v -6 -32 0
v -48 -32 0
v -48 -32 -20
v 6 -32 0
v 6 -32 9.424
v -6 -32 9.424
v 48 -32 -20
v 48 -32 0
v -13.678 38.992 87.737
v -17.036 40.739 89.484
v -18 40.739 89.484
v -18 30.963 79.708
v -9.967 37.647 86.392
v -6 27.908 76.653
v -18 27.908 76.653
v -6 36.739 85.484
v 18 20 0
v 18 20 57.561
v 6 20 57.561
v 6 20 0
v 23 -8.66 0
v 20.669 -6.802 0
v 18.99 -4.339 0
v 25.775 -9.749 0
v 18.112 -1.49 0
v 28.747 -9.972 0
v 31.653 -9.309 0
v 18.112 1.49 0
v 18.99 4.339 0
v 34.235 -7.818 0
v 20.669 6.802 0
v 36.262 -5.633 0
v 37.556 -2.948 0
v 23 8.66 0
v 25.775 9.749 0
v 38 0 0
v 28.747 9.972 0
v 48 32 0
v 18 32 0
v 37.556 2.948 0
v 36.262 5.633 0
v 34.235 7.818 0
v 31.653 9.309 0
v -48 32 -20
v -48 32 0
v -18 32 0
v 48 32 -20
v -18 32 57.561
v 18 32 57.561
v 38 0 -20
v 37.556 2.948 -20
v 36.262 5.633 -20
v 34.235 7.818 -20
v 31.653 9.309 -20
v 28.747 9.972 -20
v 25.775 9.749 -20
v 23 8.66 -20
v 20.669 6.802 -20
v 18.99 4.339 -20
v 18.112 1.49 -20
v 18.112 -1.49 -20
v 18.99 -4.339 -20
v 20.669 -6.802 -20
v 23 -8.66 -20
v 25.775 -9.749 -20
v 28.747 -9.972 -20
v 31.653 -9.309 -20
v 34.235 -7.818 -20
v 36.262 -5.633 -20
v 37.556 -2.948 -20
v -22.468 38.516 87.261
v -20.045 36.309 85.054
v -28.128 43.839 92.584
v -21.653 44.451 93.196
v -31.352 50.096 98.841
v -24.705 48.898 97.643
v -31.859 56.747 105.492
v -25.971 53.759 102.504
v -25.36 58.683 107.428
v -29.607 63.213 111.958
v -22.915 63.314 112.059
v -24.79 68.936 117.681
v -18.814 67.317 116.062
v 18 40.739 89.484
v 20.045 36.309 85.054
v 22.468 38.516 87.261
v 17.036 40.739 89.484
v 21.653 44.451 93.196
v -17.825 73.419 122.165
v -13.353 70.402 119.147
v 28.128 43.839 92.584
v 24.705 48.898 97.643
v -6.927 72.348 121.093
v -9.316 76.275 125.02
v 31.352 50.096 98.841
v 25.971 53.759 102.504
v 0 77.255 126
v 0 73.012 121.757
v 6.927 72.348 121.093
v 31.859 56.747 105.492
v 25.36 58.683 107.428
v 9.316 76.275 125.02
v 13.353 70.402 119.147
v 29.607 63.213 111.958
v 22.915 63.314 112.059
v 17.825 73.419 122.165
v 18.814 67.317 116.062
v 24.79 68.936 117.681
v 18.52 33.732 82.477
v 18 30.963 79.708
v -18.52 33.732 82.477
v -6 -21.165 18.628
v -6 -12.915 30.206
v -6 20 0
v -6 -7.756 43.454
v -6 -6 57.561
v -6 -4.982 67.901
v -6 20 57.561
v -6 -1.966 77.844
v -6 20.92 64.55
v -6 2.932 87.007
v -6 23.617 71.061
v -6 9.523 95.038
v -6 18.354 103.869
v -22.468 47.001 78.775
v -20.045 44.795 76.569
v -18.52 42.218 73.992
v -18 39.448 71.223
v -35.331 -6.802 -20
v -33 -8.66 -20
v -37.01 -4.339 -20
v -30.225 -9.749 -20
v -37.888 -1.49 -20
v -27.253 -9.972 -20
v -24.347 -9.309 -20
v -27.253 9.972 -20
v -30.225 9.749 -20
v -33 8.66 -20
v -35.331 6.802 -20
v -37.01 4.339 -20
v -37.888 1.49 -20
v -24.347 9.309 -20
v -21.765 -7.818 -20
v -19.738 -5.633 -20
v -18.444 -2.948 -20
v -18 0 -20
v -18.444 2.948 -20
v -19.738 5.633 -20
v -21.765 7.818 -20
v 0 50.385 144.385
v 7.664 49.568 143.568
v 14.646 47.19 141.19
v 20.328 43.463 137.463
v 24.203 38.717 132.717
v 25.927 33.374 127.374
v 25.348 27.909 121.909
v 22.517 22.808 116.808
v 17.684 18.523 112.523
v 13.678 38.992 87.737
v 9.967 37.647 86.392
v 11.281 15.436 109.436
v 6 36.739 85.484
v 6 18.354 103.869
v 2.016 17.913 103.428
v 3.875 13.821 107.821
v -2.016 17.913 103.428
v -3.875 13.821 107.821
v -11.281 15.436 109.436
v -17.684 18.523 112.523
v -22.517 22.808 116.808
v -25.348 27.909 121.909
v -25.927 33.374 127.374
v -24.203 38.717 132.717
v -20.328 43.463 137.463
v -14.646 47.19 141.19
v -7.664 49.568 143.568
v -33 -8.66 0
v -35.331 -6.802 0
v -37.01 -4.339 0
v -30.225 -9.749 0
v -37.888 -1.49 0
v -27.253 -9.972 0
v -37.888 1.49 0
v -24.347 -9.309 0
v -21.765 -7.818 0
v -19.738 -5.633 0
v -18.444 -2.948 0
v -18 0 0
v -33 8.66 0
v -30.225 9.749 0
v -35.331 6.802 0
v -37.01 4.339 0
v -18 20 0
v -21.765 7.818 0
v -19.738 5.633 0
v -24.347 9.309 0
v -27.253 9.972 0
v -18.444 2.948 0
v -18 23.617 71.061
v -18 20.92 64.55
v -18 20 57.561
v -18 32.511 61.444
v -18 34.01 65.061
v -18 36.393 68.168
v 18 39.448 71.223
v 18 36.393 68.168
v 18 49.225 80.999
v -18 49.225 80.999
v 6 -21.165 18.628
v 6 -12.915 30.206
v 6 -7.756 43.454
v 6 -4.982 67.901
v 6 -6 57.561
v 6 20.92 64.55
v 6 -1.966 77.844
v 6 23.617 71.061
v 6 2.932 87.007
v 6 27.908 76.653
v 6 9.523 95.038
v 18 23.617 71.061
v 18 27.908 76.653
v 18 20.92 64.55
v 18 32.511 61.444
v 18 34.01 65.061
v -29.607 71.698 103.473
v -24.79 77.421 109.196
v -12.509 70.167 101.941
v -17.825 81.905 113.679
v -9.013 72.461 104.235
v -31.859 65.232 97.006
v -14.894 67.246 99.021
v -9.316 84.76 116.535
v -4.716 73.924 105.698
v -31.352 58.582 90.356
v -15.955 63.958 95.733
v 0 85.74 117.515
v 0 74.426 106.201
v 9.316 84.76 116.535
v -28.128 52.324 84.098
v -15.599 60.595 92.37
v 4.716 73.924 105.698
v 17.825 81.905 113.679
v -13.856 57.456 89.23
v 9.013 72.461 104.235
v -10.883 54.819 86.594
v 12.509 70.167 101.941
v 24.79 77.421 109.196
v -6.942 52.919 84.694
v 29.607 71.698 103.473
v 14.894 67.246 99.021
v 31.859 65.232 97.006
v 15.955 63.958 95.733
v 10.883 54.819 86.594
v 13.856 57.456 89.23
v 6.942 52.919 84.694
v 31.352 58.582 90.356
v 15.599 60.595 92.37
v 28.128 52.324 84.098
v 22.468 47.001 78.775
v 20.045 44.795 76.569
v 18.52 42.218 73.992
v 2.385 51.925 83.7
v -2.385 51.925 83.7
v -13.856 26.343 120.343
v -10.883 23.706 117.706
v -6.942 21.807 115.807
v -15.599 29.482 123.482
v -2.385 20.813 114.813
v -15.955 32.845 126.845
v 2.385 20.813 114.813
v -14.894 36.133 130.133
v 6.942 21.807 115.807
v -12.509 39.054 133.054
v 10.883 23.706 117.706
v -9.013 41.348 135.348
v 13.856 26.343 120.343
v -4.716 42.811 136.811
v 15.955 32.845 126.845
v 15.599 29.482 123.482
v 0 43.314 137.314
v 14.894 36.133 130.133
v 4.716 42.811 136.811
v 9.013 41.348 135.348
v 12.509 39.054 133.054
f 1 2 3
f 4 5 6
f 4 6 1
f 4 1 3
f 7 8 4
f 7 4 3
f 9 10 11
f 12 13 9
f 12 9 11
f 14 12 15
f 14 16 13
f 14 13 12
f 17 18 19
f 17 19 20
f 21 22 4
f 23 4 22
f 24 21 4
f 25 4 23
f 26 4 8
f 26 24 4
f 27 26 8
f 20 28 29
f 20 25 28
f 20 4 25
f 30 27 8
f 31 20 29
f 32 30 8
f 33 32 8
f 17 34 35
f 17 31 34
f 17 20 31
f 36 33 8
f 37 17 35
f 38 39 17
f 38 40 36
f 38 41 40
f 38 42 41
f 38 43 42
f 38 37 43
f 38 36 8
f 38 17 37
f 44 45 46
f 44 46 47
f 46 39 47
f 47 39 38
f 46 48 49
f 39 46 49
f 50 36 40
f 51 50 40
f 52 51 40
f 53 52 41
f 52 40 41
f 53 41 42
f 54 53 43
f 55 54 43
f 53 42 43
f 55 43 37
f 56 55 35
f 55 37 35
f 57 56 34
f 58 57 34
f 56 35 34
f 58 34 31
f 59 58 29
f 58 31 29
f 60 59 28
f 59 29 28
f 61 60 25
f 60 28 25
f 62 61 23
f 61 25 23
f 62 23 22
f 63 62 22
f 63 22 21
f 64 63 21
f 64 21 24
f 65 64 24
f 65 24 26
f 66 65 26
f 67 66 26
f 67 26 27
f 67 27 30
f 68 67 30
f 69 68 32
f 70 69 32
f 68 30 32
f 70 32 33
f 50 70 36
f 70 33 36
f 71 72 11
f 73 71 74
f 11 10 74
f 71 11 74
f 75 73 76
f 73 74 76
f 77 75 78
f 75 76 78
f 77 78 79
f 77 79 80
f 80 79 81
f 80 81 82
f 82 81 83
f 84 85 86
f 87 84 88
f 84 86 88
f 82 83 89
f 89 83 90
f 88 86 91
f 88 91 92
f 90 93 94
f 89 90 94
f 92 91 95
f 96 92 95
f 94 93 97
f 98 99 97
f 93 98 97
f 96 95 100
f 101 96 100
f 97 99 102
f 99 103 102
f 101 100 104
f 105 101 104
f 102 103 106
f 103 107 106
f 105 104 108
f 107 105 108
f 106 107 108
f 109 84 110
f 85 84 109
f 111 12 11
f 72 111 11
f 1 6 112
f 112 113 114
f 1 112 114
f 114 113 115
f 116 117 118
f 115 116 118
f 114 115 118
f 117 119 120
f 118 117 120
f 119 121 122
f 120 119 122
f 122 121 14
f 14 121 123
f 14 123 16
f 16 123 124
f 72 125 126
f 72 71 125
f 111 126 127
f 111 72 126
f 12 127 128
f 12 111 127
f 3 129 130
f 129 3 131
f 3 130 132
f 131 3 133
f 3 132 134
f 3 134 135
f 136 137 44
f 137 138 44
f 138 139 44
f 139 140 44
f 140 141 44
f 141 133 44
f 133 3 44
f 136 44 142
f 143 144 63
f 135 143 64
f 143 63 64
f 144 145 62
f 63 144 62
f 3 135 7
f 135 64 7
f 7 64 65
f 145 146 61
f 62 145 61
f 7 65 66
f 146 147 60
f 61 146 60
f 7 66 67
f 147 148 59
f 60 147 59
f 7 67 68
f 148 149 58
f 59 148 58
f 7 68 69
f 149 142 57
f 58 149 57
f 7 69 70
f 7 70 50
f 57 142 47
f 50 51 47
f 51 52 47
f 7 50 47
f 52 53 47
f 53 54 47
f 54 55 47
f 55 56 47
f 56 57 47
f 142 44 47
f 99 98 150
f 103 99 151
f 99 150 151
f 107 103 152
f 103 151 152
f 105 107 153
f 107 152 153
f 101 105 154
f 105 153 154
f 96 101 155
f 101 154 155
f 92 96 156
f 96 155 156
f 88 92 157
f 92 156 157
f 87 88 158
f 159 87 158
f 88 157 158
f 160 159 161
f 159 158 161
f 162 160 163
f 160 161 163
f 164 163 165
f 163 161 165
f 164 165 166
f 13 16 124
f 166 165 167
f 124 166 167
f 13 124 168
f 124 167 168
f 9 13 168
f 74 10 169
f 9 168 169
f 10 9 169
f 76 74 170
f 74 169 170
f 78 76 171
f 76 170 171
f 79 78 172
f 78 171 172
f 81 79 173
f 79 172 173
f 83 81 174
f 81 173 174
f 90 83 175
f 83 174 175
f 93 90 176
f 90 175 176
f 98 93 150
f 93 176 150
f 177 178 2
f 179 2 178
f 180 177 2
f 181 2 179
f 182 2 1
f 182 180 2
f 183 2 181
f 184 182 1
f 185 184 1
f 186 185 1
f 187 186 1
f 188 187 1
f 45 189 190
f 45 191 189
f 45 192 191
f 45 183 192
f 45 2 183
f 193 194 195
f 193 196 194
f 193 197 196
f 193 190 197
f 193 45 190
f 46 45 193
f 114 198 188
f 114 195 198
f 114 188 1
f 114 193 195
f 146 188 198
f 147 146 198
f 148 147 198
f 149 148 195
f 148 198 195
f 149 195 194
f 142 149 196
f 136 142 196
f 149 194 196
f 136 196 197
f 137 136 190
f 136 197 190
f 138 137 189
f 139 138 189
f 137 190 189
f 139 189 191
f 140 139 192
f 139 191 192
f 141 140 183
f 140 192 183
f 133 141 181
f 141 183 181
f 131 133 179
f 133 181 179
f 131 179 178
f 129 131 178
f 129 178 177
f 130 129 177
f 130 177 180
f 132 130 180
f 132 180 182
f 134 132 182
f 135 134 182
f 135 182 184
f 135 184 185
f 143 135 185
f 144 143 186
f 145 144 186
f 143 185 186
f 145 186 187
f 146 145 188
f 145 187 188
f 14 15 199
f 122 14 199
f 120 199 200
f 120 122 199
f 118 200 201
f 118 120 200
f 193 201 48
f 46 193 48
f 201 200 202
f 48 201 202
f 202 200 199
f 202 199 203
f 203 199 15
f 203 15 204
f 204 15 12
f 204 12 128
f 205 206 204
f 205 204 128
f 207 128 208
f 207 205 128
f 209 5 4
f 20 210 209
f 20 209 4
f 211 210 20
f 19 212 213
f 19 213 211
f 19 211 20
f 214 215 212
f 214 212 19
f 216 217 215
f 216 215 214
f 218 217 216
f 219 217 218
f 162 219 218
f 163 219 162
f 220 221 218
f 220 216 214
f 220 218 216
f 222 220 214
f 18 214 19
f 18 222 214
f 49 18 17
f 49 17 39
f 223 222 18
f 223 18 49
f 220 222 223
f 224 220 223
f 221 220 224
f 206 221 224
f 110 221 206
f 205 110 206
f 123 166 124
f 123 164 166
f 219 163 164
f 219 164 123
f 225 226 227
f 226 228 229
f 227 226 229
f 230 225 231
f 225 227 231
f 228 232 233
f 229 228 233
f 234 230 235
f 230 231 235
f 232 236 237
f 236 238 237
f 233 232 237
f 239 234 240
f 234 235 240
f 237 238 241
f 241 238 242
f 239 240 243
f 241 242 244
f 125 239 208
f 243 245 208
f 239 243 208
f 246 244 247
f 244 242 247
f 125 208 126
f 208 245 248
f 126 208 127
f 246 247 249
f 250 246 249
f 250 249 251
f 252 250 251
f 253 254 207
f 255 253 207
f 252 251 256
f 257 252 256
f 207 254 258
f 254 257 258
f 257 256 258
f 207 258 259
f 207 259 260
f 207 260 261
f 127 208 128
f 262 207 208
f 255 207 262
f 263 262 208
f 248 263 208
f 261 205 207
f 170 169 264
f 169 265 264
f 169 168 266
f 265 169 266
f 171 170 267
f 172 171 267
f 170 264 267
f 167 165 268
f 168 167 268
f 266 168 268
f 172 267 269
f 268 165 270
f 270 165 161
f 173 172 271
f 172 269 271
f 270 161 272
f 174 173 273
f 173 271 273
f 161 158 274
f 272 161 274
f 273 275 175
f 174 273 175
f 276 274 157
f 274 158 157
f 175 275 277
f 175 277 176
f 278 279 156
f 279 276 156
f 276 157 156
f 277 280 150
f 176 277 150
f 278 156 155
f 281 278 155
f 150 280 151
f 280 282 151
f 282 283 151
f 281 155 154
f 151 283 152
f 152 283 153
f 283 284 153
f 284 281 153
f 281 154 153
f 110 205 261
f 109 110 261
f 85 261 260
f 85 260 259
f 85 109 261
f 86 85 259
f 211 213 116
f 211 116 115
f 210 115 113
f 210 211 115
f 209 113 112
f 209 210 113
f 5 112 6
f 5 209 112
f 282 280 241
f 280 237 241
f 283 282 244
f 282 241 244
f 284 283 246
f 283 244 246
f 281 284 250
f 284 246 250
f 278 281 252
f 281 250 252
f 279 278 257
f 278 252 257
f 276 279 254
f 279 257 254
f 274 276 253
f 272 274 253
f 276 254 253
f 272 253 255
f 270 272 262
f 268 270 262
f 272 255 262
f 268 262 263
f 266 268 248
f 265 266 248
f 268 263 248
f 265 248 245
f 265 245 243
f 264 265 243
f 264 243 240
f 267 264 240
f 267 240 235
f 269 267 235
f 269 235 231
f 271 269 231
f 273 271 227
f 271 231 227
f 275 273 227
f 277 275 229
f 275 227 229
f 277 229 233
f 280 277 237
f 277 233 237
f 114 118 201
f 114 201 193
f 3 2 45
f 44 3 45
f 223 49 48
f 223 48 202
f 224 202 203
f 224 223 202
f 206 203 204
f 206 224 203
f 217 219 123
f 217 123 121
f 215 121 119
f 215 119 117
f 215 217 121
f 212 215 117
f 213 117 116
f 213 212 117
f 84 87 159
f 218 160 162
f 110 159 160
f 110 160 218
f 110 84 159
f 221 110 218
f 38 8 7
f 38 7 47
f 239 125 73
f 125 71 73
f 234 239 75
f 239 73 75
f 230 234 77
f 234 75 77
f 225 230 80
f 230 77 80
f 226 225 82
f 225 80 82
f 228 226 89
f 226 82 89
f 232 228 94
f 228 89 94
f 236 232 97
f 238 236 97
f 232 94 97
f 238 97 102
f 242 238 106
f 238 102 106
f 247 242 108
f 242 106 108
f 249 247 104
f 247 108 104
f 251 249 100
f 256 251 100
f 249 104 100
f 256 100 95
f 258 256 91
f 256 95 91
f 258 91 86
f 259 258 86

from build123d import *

# Parameters (mm, degrees)
F0_W     = 96
F0_H     = 64
F0_R     = 10
F1_DEPTH = 20
F5_DEPTH = 6
F6_DEPTH = 18
F8_R     = 15


with BuildPart() as f1:
    # F0 (on Top) → F1 (new body)
    with BuildSketch(Plane.XY):
        Rectangle(F0_W, F0_H)
        with Locations((-28, 0)):
            Circle(F0_R, mode=Mode.SUBTRACT)
        with Locations((28, 0)):
            Circle(F0_R, mode=Mode.SUBTRACT)
    extrude(amount=-F1_DEPTH)


with BuildPart() as f3:
    # F2 (on Right) → F3 (revolve)
    with BuildSketch(Plane.YZ):
        Polygon((50.3847763109, 144.3847763109), (43.313708499, 137.313708499), (65.941125497, 114.686291501), (73.0121933088, 121.7573593129), align=None)
        Polygon((73.0121933088, 121.7573593129), (65.941125497, 114.686291501), (74.4264068712, 106.2010101268), (85.7401153702, 117.5147186258), (77.2548339959, 126), align=None)
    revolve(axis=Axis((0, 47.5563491861, 110.4436508139), (0, 0.7071067812, -0.7071067812)))


with BuildPart() as f5:
    # F4 (on Right) → F5 (new body, symmetric)
    with BuildSketch(Plane.YZ):
        Polygon((9.5233405971, 95.0380592229), (27.908116908, 76.653282912), (40.7393130211, 89.4844790252), (22.3545367103, 107.869255336), align=None)
        with BuildLine():
            Line((-32, 0), (20, 0))
            Line((20, 0), (20, 57.56139982))
            ThreePointArc((20, 57.56139982), (22.0552526222, 67.8938524938), (27.908116908, 76.653282912))
            Line((27.908116908, 76.653282912), (9.5233405971, 95.0380592229))
            ThreePointArc((9.5233405971, 95.0380592229), (-1.9656152231, 77.8436217353), (-6, 57.56139982))
            ThreePointArc((-6, 57.56139982), (-12.9154073667, 30.2063601077), (-32, 9.4241710813))
            Line((-32, 9.4241710813), (-32, 0))
        make_face()
    extrude(amount=F5_DEPTH, both=True)


with BuildPart() as f6:
    # F4 (on Right) → F6 (new body, symmetric)
    with BuildSketch(Plane.YZ):
        with BuildLine():
            Line((20, 0), (32, 0))
            Line((32, 0), (32, 57.56139982))
            ThreePointArc((32, 57.56139982), (33.1418070123, 63.3016513055), (36.3933982822, 68.1680015378))
            Line((36.3933982822, 68.1680015378), (27.908116908, 76.653282912))
            ThreePointArc((27.908116908, 76.653282912), (22.0552526222, 67.8938524938), (20, 57.56139982))
            Line((20, 57.56139982), (20, 0))
        make_face()
        Polygon((27.908116908, 76.653282912), (36.3933982822, 68.1680015378), (49.2245943954, 80.9991976509), (40.7393130211, 89.4844790252), align=None)
    extrude(amount=F6_DEPTH, both=True)

    # F7: union F1, F3, F5
    add(f1.part)
    add(f3.part)
    add(f5.part)

    # F8
    f8_edges = [f6.edges().sort_by_distance(p)[0] for p in [
        (18, 40.161771, 80.421655),
        (-18, 40.161771, 80.421655),
    ]]
    fillet(f8_edges, radius=F8_R)


solid = f6.part
